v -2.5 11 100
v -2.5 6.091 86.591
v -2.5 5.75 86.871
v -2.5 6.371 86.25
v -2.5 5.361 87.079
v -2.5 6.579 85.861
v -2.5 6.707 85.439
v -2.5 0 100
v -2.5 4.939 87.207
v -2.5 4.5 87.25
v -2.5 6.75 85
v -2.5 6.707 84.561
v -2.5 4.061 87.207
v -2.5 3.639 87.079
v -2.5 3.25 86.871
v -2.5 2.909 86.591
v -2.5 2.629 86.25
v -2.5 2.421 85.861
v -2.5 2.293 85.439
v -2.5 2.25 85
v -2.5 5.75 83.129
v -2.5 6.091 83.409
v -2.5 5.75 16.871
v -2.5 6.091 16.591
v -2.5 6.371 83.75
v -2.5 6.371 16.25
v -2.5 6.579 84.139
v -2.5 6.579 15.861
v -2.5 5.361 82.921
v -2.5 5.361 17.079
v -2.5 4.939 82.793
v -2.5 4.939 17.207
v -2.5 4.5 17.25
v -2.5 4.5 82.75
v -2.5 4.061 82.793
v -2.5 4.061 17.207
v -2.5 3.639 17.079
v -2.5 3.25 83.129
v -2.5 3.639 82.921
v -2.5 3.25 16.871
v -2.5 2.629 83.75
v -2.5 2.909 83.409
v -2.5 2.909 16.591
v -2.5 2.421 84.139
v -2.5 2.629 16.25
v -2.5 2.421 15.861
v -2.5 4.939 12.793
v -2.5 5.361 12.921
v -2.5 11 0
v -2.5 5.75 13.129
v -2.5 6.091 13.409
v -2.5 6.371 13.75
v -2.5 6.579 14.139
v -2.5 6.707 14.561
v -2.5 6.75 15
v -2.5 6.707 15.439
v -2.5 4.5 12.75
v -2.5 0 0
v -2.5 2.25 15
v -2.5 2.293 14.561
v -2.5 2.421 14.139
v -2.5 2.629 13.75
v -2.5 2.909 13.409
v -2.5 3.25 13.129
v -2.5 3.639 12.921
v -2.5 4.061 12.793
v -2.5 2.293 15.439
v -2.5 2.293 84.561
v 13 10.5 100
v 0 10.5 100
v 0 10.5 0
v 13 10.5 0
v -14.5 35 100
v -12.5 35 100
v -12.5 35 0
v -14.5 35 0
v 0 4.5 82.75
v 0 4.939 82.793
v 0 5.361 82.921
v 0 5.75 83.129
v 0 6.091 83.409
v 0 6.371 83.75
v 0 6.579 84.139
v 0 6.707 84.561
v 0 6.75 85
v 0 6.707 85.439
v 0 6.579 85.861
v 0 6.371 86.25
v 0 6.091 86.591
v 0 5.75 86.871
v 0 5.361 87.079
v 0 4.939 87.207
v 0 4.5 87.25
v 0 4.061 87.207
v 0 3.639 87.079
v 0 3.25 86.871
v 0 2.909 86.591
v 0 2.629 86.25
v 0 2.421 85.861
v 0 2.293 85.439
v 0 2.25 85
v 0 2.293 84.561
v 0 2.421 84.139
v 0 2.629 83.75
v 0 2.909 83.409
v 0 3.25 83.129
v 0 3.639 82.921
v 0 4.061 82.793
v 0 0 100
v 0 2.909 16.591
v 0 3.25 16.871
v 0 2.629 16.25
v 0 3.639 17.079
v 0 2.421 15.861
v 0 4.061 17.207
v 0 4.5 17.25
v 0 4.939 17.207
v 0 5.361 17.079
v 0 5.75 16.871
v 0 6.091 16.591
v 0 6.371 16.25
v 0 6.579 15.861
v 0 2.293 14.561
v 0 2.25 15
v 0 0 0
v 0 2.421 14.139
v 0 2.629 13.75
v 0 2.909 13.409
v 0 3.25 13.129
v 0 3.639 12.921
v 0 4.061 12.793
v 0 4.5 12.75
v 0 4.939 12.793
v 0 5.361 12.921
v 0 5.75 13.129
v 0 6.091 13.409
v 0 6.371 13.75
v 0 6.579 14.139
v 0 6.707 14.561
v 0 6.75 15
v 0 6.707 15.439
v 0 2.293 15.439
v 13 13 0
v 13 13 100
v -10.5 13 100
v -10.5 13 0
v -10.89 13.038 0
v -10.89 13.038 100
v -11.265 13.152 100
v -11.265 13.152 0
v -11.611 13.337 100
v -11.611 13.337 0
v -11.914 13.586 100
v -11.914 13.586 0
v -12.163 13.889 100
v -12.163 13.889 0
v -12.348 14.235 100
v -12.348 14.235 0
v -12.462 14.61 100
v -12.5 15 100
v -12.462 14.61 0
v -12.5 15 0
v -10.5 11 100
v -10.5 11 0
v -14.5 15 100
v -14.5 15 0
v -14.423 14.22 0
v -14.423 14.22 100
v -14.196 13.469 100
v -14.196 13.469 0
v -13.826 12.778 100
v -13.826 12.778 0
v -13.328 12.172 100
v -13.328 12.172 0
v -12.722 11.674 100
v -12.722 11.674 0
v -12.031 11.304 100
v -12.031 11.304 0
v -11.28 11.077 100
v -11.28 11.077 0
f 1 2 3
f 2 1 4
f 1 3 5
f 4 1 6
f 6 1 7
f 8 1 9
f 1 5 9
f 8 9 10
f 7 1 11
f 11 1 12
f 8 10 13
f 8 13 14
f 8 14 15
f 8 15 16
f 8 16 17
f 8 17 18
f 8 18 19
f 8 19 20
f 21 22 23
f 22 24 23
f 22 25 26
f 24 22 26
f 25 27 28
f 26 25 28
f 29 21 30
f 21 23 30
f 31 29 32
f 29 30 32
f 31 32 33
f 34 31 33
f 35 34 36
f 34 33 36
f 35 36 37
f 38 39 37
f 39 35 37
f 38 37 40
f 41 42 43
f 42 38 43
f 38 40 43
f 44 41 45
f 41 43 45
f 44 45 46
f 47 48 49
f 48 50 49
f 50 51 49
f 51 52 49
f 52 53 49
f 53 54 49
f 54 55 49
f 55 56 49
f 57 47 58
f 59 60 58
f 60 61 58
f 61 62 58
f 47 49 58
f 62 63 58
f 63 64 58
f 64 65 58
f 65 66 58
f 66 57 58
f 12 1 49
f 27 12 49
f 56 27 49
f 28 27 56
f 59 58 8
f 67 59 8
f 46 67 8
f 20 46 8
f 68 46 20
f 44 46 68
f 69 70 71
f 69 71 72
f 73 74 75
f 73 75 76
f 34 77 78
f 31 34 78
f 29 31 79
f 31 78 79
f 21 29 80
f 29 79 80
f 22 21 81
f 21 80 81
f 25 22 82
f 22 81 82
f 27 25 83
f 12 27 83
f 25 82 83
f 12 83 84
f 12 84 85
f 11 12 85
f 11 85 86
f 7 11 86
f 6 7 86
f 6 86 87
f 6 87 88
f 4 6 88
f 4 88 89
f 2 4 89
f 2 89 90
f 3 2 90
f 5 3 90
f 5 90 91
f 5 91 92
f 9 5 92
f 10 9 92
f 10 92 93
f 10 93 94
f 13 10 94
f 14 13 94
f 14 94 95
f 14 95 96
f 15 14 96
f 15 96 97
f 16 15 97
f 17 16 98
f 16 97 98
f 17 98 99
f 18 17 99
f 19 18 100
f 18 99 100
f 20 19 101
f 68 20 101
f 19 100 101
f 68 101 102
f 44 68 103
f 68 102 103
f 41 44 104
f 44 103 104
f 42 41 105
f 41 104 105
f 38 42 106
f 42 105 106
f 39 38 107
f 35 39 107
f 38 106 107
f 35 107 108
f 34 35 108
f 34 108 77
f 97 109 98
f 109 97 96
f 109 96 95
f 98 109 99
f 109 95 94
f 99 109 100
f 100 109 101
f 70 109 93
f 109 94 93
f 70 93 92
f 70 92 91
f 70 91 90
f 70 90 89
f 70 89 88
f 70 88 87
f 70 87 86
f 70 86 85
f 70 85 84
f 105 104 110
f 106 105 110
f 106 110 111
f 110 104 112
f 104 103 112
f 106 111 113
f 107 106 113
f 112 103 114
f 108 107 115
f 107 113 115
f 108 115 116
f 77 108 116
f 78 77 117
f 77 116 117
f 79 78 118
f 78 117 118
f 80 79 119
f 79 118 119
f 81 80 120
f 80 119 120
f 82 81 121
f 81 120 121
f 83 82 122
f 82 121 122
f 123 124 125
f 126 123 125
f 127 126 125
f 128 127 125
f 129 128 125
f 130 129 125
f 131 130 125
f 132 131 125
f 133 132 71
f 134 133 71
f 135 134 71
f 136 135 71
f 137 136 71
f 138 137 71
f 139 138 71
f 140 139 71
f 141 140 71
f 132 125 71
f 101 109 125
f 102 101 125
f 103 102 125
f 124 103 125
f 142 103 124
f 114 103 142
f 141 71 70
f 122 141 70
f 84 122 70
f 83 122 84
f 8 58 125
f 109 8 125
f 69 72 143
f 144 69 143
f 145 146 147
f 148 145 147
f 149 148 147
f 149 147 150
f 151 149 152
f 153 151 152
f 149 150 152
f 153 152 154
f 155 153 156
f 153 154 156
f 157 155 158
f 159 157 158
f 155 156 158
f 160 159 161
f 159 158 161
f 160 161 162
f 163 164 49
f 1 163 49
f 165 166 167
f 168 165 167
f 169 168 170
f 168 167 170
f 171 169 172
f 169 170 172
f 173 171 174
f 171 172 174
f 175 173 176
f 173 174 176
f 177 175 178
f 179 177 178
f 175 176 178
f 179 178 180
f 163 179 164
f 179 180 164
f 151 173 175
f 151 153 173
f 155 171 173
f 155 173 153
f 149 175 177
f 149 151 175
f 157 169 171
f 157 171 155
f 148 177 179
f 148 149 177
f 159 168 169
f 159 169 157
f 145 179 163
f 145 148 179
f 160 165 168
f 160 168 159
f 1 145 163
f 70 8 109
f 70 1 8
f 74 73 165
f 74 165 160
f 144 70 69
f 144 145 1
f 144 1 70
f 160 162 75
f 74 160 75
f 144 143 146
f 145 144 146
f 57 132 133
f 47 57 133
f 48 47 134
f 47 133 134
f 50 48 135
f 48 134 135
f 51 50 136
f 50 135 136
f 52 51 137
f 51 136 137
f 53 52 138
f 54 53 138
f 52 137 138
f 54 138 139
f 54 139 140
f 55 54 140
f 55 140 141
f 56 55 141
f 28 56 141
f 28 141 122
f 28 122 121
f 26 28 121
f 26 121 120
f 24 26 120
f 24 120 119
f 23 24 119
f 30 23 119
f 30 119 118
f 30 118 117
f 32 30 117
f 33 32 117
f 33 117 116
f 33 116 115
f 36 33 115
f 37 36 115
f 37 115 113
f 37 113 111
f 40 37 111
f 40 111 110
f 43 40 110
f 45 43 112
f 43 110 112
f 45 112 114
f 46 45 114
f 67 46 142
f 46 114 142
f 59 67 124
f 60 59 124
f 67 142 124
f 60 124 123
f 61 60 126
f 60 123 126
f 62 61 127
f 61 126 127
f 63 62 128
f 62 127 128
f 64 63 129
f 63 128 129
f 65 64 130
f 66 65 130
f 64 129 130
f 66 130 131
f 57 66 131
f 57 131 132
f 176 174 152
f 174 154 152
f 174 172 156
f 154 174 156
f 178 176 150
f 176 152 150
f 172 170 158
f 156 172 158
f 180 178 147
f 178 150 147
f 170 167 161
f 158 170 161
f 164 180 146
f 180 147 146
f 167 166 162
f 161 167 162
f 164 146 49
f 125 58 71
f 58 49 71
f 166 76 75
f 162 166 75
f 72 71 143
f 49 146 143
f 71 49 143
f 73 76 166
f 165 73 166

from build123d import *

# Parameters (mm, degrees)
ESTRUSIONE_ESTRUSIONE1_DEPTH = 100
FORO_PER_VITE_M4_1_D         = 4.5
FORO_PER_VITE_M4_1_DEPTH     = 30
FORO_PER_VITE_M4_1_TIP       = 1.351936393


with BuildPart() as part:
    # Schizzo1 → Estrusione-Estrusione1 (new body)
    with BuildSketch(Plane.XY):
        with BuildLine():
            Line((-2.5, 0), (0, 0))
            Line((0, 0), (0, 10.5))
            Line((0, 10.5), (13, 10.5))
            Line((13, 10.5), (13, 13))
            Line((13, 13), (-10.5, 13))
            ThreePointArc((-10.5, 13), (-11.914213562, 13.585786438), (-12.5, 15))
            Line((-12.5, 15), (-12.5, 35))
            Line((-12.5, 35), (-14.5, 35))
            Line((-14.5, 35), (-14.5, 15))
            ThreePointArc((-14.5, 15), (-13.328427125, 12.171572875), (-10.5, 11))
            Line((-10.5, 11), (-2.5, 11))
            Line((-2.5, 11), (-2.5, 0))
        make_face()
    extrude(amount=ESTRUSIONE_ESTRUSIONE1_DEPTH)

    # Foro per Vite M4-1
    with Locations(Plane.ZY.offset(2.5)):
        with Locations((15, 4.5), (85, 4.5)):
            Hole(FORO_PER_VITE_M4_1_D / 2, depth=FORO_PER_VITE_M4_1_DEPTH)
            with Locations((0, 0, -(FORO_PER_VITE_M4_1_DEPTH + FORO_PER_VITE_M4_1_TIP / 2))):  # 118° drill point
                Cone(0, FORO_PER_VITE_M4_1_D / 2, FORO_PER_VITE_M4_1_TIP, mode=Mode.SUBTRACT)


solid = part.part
